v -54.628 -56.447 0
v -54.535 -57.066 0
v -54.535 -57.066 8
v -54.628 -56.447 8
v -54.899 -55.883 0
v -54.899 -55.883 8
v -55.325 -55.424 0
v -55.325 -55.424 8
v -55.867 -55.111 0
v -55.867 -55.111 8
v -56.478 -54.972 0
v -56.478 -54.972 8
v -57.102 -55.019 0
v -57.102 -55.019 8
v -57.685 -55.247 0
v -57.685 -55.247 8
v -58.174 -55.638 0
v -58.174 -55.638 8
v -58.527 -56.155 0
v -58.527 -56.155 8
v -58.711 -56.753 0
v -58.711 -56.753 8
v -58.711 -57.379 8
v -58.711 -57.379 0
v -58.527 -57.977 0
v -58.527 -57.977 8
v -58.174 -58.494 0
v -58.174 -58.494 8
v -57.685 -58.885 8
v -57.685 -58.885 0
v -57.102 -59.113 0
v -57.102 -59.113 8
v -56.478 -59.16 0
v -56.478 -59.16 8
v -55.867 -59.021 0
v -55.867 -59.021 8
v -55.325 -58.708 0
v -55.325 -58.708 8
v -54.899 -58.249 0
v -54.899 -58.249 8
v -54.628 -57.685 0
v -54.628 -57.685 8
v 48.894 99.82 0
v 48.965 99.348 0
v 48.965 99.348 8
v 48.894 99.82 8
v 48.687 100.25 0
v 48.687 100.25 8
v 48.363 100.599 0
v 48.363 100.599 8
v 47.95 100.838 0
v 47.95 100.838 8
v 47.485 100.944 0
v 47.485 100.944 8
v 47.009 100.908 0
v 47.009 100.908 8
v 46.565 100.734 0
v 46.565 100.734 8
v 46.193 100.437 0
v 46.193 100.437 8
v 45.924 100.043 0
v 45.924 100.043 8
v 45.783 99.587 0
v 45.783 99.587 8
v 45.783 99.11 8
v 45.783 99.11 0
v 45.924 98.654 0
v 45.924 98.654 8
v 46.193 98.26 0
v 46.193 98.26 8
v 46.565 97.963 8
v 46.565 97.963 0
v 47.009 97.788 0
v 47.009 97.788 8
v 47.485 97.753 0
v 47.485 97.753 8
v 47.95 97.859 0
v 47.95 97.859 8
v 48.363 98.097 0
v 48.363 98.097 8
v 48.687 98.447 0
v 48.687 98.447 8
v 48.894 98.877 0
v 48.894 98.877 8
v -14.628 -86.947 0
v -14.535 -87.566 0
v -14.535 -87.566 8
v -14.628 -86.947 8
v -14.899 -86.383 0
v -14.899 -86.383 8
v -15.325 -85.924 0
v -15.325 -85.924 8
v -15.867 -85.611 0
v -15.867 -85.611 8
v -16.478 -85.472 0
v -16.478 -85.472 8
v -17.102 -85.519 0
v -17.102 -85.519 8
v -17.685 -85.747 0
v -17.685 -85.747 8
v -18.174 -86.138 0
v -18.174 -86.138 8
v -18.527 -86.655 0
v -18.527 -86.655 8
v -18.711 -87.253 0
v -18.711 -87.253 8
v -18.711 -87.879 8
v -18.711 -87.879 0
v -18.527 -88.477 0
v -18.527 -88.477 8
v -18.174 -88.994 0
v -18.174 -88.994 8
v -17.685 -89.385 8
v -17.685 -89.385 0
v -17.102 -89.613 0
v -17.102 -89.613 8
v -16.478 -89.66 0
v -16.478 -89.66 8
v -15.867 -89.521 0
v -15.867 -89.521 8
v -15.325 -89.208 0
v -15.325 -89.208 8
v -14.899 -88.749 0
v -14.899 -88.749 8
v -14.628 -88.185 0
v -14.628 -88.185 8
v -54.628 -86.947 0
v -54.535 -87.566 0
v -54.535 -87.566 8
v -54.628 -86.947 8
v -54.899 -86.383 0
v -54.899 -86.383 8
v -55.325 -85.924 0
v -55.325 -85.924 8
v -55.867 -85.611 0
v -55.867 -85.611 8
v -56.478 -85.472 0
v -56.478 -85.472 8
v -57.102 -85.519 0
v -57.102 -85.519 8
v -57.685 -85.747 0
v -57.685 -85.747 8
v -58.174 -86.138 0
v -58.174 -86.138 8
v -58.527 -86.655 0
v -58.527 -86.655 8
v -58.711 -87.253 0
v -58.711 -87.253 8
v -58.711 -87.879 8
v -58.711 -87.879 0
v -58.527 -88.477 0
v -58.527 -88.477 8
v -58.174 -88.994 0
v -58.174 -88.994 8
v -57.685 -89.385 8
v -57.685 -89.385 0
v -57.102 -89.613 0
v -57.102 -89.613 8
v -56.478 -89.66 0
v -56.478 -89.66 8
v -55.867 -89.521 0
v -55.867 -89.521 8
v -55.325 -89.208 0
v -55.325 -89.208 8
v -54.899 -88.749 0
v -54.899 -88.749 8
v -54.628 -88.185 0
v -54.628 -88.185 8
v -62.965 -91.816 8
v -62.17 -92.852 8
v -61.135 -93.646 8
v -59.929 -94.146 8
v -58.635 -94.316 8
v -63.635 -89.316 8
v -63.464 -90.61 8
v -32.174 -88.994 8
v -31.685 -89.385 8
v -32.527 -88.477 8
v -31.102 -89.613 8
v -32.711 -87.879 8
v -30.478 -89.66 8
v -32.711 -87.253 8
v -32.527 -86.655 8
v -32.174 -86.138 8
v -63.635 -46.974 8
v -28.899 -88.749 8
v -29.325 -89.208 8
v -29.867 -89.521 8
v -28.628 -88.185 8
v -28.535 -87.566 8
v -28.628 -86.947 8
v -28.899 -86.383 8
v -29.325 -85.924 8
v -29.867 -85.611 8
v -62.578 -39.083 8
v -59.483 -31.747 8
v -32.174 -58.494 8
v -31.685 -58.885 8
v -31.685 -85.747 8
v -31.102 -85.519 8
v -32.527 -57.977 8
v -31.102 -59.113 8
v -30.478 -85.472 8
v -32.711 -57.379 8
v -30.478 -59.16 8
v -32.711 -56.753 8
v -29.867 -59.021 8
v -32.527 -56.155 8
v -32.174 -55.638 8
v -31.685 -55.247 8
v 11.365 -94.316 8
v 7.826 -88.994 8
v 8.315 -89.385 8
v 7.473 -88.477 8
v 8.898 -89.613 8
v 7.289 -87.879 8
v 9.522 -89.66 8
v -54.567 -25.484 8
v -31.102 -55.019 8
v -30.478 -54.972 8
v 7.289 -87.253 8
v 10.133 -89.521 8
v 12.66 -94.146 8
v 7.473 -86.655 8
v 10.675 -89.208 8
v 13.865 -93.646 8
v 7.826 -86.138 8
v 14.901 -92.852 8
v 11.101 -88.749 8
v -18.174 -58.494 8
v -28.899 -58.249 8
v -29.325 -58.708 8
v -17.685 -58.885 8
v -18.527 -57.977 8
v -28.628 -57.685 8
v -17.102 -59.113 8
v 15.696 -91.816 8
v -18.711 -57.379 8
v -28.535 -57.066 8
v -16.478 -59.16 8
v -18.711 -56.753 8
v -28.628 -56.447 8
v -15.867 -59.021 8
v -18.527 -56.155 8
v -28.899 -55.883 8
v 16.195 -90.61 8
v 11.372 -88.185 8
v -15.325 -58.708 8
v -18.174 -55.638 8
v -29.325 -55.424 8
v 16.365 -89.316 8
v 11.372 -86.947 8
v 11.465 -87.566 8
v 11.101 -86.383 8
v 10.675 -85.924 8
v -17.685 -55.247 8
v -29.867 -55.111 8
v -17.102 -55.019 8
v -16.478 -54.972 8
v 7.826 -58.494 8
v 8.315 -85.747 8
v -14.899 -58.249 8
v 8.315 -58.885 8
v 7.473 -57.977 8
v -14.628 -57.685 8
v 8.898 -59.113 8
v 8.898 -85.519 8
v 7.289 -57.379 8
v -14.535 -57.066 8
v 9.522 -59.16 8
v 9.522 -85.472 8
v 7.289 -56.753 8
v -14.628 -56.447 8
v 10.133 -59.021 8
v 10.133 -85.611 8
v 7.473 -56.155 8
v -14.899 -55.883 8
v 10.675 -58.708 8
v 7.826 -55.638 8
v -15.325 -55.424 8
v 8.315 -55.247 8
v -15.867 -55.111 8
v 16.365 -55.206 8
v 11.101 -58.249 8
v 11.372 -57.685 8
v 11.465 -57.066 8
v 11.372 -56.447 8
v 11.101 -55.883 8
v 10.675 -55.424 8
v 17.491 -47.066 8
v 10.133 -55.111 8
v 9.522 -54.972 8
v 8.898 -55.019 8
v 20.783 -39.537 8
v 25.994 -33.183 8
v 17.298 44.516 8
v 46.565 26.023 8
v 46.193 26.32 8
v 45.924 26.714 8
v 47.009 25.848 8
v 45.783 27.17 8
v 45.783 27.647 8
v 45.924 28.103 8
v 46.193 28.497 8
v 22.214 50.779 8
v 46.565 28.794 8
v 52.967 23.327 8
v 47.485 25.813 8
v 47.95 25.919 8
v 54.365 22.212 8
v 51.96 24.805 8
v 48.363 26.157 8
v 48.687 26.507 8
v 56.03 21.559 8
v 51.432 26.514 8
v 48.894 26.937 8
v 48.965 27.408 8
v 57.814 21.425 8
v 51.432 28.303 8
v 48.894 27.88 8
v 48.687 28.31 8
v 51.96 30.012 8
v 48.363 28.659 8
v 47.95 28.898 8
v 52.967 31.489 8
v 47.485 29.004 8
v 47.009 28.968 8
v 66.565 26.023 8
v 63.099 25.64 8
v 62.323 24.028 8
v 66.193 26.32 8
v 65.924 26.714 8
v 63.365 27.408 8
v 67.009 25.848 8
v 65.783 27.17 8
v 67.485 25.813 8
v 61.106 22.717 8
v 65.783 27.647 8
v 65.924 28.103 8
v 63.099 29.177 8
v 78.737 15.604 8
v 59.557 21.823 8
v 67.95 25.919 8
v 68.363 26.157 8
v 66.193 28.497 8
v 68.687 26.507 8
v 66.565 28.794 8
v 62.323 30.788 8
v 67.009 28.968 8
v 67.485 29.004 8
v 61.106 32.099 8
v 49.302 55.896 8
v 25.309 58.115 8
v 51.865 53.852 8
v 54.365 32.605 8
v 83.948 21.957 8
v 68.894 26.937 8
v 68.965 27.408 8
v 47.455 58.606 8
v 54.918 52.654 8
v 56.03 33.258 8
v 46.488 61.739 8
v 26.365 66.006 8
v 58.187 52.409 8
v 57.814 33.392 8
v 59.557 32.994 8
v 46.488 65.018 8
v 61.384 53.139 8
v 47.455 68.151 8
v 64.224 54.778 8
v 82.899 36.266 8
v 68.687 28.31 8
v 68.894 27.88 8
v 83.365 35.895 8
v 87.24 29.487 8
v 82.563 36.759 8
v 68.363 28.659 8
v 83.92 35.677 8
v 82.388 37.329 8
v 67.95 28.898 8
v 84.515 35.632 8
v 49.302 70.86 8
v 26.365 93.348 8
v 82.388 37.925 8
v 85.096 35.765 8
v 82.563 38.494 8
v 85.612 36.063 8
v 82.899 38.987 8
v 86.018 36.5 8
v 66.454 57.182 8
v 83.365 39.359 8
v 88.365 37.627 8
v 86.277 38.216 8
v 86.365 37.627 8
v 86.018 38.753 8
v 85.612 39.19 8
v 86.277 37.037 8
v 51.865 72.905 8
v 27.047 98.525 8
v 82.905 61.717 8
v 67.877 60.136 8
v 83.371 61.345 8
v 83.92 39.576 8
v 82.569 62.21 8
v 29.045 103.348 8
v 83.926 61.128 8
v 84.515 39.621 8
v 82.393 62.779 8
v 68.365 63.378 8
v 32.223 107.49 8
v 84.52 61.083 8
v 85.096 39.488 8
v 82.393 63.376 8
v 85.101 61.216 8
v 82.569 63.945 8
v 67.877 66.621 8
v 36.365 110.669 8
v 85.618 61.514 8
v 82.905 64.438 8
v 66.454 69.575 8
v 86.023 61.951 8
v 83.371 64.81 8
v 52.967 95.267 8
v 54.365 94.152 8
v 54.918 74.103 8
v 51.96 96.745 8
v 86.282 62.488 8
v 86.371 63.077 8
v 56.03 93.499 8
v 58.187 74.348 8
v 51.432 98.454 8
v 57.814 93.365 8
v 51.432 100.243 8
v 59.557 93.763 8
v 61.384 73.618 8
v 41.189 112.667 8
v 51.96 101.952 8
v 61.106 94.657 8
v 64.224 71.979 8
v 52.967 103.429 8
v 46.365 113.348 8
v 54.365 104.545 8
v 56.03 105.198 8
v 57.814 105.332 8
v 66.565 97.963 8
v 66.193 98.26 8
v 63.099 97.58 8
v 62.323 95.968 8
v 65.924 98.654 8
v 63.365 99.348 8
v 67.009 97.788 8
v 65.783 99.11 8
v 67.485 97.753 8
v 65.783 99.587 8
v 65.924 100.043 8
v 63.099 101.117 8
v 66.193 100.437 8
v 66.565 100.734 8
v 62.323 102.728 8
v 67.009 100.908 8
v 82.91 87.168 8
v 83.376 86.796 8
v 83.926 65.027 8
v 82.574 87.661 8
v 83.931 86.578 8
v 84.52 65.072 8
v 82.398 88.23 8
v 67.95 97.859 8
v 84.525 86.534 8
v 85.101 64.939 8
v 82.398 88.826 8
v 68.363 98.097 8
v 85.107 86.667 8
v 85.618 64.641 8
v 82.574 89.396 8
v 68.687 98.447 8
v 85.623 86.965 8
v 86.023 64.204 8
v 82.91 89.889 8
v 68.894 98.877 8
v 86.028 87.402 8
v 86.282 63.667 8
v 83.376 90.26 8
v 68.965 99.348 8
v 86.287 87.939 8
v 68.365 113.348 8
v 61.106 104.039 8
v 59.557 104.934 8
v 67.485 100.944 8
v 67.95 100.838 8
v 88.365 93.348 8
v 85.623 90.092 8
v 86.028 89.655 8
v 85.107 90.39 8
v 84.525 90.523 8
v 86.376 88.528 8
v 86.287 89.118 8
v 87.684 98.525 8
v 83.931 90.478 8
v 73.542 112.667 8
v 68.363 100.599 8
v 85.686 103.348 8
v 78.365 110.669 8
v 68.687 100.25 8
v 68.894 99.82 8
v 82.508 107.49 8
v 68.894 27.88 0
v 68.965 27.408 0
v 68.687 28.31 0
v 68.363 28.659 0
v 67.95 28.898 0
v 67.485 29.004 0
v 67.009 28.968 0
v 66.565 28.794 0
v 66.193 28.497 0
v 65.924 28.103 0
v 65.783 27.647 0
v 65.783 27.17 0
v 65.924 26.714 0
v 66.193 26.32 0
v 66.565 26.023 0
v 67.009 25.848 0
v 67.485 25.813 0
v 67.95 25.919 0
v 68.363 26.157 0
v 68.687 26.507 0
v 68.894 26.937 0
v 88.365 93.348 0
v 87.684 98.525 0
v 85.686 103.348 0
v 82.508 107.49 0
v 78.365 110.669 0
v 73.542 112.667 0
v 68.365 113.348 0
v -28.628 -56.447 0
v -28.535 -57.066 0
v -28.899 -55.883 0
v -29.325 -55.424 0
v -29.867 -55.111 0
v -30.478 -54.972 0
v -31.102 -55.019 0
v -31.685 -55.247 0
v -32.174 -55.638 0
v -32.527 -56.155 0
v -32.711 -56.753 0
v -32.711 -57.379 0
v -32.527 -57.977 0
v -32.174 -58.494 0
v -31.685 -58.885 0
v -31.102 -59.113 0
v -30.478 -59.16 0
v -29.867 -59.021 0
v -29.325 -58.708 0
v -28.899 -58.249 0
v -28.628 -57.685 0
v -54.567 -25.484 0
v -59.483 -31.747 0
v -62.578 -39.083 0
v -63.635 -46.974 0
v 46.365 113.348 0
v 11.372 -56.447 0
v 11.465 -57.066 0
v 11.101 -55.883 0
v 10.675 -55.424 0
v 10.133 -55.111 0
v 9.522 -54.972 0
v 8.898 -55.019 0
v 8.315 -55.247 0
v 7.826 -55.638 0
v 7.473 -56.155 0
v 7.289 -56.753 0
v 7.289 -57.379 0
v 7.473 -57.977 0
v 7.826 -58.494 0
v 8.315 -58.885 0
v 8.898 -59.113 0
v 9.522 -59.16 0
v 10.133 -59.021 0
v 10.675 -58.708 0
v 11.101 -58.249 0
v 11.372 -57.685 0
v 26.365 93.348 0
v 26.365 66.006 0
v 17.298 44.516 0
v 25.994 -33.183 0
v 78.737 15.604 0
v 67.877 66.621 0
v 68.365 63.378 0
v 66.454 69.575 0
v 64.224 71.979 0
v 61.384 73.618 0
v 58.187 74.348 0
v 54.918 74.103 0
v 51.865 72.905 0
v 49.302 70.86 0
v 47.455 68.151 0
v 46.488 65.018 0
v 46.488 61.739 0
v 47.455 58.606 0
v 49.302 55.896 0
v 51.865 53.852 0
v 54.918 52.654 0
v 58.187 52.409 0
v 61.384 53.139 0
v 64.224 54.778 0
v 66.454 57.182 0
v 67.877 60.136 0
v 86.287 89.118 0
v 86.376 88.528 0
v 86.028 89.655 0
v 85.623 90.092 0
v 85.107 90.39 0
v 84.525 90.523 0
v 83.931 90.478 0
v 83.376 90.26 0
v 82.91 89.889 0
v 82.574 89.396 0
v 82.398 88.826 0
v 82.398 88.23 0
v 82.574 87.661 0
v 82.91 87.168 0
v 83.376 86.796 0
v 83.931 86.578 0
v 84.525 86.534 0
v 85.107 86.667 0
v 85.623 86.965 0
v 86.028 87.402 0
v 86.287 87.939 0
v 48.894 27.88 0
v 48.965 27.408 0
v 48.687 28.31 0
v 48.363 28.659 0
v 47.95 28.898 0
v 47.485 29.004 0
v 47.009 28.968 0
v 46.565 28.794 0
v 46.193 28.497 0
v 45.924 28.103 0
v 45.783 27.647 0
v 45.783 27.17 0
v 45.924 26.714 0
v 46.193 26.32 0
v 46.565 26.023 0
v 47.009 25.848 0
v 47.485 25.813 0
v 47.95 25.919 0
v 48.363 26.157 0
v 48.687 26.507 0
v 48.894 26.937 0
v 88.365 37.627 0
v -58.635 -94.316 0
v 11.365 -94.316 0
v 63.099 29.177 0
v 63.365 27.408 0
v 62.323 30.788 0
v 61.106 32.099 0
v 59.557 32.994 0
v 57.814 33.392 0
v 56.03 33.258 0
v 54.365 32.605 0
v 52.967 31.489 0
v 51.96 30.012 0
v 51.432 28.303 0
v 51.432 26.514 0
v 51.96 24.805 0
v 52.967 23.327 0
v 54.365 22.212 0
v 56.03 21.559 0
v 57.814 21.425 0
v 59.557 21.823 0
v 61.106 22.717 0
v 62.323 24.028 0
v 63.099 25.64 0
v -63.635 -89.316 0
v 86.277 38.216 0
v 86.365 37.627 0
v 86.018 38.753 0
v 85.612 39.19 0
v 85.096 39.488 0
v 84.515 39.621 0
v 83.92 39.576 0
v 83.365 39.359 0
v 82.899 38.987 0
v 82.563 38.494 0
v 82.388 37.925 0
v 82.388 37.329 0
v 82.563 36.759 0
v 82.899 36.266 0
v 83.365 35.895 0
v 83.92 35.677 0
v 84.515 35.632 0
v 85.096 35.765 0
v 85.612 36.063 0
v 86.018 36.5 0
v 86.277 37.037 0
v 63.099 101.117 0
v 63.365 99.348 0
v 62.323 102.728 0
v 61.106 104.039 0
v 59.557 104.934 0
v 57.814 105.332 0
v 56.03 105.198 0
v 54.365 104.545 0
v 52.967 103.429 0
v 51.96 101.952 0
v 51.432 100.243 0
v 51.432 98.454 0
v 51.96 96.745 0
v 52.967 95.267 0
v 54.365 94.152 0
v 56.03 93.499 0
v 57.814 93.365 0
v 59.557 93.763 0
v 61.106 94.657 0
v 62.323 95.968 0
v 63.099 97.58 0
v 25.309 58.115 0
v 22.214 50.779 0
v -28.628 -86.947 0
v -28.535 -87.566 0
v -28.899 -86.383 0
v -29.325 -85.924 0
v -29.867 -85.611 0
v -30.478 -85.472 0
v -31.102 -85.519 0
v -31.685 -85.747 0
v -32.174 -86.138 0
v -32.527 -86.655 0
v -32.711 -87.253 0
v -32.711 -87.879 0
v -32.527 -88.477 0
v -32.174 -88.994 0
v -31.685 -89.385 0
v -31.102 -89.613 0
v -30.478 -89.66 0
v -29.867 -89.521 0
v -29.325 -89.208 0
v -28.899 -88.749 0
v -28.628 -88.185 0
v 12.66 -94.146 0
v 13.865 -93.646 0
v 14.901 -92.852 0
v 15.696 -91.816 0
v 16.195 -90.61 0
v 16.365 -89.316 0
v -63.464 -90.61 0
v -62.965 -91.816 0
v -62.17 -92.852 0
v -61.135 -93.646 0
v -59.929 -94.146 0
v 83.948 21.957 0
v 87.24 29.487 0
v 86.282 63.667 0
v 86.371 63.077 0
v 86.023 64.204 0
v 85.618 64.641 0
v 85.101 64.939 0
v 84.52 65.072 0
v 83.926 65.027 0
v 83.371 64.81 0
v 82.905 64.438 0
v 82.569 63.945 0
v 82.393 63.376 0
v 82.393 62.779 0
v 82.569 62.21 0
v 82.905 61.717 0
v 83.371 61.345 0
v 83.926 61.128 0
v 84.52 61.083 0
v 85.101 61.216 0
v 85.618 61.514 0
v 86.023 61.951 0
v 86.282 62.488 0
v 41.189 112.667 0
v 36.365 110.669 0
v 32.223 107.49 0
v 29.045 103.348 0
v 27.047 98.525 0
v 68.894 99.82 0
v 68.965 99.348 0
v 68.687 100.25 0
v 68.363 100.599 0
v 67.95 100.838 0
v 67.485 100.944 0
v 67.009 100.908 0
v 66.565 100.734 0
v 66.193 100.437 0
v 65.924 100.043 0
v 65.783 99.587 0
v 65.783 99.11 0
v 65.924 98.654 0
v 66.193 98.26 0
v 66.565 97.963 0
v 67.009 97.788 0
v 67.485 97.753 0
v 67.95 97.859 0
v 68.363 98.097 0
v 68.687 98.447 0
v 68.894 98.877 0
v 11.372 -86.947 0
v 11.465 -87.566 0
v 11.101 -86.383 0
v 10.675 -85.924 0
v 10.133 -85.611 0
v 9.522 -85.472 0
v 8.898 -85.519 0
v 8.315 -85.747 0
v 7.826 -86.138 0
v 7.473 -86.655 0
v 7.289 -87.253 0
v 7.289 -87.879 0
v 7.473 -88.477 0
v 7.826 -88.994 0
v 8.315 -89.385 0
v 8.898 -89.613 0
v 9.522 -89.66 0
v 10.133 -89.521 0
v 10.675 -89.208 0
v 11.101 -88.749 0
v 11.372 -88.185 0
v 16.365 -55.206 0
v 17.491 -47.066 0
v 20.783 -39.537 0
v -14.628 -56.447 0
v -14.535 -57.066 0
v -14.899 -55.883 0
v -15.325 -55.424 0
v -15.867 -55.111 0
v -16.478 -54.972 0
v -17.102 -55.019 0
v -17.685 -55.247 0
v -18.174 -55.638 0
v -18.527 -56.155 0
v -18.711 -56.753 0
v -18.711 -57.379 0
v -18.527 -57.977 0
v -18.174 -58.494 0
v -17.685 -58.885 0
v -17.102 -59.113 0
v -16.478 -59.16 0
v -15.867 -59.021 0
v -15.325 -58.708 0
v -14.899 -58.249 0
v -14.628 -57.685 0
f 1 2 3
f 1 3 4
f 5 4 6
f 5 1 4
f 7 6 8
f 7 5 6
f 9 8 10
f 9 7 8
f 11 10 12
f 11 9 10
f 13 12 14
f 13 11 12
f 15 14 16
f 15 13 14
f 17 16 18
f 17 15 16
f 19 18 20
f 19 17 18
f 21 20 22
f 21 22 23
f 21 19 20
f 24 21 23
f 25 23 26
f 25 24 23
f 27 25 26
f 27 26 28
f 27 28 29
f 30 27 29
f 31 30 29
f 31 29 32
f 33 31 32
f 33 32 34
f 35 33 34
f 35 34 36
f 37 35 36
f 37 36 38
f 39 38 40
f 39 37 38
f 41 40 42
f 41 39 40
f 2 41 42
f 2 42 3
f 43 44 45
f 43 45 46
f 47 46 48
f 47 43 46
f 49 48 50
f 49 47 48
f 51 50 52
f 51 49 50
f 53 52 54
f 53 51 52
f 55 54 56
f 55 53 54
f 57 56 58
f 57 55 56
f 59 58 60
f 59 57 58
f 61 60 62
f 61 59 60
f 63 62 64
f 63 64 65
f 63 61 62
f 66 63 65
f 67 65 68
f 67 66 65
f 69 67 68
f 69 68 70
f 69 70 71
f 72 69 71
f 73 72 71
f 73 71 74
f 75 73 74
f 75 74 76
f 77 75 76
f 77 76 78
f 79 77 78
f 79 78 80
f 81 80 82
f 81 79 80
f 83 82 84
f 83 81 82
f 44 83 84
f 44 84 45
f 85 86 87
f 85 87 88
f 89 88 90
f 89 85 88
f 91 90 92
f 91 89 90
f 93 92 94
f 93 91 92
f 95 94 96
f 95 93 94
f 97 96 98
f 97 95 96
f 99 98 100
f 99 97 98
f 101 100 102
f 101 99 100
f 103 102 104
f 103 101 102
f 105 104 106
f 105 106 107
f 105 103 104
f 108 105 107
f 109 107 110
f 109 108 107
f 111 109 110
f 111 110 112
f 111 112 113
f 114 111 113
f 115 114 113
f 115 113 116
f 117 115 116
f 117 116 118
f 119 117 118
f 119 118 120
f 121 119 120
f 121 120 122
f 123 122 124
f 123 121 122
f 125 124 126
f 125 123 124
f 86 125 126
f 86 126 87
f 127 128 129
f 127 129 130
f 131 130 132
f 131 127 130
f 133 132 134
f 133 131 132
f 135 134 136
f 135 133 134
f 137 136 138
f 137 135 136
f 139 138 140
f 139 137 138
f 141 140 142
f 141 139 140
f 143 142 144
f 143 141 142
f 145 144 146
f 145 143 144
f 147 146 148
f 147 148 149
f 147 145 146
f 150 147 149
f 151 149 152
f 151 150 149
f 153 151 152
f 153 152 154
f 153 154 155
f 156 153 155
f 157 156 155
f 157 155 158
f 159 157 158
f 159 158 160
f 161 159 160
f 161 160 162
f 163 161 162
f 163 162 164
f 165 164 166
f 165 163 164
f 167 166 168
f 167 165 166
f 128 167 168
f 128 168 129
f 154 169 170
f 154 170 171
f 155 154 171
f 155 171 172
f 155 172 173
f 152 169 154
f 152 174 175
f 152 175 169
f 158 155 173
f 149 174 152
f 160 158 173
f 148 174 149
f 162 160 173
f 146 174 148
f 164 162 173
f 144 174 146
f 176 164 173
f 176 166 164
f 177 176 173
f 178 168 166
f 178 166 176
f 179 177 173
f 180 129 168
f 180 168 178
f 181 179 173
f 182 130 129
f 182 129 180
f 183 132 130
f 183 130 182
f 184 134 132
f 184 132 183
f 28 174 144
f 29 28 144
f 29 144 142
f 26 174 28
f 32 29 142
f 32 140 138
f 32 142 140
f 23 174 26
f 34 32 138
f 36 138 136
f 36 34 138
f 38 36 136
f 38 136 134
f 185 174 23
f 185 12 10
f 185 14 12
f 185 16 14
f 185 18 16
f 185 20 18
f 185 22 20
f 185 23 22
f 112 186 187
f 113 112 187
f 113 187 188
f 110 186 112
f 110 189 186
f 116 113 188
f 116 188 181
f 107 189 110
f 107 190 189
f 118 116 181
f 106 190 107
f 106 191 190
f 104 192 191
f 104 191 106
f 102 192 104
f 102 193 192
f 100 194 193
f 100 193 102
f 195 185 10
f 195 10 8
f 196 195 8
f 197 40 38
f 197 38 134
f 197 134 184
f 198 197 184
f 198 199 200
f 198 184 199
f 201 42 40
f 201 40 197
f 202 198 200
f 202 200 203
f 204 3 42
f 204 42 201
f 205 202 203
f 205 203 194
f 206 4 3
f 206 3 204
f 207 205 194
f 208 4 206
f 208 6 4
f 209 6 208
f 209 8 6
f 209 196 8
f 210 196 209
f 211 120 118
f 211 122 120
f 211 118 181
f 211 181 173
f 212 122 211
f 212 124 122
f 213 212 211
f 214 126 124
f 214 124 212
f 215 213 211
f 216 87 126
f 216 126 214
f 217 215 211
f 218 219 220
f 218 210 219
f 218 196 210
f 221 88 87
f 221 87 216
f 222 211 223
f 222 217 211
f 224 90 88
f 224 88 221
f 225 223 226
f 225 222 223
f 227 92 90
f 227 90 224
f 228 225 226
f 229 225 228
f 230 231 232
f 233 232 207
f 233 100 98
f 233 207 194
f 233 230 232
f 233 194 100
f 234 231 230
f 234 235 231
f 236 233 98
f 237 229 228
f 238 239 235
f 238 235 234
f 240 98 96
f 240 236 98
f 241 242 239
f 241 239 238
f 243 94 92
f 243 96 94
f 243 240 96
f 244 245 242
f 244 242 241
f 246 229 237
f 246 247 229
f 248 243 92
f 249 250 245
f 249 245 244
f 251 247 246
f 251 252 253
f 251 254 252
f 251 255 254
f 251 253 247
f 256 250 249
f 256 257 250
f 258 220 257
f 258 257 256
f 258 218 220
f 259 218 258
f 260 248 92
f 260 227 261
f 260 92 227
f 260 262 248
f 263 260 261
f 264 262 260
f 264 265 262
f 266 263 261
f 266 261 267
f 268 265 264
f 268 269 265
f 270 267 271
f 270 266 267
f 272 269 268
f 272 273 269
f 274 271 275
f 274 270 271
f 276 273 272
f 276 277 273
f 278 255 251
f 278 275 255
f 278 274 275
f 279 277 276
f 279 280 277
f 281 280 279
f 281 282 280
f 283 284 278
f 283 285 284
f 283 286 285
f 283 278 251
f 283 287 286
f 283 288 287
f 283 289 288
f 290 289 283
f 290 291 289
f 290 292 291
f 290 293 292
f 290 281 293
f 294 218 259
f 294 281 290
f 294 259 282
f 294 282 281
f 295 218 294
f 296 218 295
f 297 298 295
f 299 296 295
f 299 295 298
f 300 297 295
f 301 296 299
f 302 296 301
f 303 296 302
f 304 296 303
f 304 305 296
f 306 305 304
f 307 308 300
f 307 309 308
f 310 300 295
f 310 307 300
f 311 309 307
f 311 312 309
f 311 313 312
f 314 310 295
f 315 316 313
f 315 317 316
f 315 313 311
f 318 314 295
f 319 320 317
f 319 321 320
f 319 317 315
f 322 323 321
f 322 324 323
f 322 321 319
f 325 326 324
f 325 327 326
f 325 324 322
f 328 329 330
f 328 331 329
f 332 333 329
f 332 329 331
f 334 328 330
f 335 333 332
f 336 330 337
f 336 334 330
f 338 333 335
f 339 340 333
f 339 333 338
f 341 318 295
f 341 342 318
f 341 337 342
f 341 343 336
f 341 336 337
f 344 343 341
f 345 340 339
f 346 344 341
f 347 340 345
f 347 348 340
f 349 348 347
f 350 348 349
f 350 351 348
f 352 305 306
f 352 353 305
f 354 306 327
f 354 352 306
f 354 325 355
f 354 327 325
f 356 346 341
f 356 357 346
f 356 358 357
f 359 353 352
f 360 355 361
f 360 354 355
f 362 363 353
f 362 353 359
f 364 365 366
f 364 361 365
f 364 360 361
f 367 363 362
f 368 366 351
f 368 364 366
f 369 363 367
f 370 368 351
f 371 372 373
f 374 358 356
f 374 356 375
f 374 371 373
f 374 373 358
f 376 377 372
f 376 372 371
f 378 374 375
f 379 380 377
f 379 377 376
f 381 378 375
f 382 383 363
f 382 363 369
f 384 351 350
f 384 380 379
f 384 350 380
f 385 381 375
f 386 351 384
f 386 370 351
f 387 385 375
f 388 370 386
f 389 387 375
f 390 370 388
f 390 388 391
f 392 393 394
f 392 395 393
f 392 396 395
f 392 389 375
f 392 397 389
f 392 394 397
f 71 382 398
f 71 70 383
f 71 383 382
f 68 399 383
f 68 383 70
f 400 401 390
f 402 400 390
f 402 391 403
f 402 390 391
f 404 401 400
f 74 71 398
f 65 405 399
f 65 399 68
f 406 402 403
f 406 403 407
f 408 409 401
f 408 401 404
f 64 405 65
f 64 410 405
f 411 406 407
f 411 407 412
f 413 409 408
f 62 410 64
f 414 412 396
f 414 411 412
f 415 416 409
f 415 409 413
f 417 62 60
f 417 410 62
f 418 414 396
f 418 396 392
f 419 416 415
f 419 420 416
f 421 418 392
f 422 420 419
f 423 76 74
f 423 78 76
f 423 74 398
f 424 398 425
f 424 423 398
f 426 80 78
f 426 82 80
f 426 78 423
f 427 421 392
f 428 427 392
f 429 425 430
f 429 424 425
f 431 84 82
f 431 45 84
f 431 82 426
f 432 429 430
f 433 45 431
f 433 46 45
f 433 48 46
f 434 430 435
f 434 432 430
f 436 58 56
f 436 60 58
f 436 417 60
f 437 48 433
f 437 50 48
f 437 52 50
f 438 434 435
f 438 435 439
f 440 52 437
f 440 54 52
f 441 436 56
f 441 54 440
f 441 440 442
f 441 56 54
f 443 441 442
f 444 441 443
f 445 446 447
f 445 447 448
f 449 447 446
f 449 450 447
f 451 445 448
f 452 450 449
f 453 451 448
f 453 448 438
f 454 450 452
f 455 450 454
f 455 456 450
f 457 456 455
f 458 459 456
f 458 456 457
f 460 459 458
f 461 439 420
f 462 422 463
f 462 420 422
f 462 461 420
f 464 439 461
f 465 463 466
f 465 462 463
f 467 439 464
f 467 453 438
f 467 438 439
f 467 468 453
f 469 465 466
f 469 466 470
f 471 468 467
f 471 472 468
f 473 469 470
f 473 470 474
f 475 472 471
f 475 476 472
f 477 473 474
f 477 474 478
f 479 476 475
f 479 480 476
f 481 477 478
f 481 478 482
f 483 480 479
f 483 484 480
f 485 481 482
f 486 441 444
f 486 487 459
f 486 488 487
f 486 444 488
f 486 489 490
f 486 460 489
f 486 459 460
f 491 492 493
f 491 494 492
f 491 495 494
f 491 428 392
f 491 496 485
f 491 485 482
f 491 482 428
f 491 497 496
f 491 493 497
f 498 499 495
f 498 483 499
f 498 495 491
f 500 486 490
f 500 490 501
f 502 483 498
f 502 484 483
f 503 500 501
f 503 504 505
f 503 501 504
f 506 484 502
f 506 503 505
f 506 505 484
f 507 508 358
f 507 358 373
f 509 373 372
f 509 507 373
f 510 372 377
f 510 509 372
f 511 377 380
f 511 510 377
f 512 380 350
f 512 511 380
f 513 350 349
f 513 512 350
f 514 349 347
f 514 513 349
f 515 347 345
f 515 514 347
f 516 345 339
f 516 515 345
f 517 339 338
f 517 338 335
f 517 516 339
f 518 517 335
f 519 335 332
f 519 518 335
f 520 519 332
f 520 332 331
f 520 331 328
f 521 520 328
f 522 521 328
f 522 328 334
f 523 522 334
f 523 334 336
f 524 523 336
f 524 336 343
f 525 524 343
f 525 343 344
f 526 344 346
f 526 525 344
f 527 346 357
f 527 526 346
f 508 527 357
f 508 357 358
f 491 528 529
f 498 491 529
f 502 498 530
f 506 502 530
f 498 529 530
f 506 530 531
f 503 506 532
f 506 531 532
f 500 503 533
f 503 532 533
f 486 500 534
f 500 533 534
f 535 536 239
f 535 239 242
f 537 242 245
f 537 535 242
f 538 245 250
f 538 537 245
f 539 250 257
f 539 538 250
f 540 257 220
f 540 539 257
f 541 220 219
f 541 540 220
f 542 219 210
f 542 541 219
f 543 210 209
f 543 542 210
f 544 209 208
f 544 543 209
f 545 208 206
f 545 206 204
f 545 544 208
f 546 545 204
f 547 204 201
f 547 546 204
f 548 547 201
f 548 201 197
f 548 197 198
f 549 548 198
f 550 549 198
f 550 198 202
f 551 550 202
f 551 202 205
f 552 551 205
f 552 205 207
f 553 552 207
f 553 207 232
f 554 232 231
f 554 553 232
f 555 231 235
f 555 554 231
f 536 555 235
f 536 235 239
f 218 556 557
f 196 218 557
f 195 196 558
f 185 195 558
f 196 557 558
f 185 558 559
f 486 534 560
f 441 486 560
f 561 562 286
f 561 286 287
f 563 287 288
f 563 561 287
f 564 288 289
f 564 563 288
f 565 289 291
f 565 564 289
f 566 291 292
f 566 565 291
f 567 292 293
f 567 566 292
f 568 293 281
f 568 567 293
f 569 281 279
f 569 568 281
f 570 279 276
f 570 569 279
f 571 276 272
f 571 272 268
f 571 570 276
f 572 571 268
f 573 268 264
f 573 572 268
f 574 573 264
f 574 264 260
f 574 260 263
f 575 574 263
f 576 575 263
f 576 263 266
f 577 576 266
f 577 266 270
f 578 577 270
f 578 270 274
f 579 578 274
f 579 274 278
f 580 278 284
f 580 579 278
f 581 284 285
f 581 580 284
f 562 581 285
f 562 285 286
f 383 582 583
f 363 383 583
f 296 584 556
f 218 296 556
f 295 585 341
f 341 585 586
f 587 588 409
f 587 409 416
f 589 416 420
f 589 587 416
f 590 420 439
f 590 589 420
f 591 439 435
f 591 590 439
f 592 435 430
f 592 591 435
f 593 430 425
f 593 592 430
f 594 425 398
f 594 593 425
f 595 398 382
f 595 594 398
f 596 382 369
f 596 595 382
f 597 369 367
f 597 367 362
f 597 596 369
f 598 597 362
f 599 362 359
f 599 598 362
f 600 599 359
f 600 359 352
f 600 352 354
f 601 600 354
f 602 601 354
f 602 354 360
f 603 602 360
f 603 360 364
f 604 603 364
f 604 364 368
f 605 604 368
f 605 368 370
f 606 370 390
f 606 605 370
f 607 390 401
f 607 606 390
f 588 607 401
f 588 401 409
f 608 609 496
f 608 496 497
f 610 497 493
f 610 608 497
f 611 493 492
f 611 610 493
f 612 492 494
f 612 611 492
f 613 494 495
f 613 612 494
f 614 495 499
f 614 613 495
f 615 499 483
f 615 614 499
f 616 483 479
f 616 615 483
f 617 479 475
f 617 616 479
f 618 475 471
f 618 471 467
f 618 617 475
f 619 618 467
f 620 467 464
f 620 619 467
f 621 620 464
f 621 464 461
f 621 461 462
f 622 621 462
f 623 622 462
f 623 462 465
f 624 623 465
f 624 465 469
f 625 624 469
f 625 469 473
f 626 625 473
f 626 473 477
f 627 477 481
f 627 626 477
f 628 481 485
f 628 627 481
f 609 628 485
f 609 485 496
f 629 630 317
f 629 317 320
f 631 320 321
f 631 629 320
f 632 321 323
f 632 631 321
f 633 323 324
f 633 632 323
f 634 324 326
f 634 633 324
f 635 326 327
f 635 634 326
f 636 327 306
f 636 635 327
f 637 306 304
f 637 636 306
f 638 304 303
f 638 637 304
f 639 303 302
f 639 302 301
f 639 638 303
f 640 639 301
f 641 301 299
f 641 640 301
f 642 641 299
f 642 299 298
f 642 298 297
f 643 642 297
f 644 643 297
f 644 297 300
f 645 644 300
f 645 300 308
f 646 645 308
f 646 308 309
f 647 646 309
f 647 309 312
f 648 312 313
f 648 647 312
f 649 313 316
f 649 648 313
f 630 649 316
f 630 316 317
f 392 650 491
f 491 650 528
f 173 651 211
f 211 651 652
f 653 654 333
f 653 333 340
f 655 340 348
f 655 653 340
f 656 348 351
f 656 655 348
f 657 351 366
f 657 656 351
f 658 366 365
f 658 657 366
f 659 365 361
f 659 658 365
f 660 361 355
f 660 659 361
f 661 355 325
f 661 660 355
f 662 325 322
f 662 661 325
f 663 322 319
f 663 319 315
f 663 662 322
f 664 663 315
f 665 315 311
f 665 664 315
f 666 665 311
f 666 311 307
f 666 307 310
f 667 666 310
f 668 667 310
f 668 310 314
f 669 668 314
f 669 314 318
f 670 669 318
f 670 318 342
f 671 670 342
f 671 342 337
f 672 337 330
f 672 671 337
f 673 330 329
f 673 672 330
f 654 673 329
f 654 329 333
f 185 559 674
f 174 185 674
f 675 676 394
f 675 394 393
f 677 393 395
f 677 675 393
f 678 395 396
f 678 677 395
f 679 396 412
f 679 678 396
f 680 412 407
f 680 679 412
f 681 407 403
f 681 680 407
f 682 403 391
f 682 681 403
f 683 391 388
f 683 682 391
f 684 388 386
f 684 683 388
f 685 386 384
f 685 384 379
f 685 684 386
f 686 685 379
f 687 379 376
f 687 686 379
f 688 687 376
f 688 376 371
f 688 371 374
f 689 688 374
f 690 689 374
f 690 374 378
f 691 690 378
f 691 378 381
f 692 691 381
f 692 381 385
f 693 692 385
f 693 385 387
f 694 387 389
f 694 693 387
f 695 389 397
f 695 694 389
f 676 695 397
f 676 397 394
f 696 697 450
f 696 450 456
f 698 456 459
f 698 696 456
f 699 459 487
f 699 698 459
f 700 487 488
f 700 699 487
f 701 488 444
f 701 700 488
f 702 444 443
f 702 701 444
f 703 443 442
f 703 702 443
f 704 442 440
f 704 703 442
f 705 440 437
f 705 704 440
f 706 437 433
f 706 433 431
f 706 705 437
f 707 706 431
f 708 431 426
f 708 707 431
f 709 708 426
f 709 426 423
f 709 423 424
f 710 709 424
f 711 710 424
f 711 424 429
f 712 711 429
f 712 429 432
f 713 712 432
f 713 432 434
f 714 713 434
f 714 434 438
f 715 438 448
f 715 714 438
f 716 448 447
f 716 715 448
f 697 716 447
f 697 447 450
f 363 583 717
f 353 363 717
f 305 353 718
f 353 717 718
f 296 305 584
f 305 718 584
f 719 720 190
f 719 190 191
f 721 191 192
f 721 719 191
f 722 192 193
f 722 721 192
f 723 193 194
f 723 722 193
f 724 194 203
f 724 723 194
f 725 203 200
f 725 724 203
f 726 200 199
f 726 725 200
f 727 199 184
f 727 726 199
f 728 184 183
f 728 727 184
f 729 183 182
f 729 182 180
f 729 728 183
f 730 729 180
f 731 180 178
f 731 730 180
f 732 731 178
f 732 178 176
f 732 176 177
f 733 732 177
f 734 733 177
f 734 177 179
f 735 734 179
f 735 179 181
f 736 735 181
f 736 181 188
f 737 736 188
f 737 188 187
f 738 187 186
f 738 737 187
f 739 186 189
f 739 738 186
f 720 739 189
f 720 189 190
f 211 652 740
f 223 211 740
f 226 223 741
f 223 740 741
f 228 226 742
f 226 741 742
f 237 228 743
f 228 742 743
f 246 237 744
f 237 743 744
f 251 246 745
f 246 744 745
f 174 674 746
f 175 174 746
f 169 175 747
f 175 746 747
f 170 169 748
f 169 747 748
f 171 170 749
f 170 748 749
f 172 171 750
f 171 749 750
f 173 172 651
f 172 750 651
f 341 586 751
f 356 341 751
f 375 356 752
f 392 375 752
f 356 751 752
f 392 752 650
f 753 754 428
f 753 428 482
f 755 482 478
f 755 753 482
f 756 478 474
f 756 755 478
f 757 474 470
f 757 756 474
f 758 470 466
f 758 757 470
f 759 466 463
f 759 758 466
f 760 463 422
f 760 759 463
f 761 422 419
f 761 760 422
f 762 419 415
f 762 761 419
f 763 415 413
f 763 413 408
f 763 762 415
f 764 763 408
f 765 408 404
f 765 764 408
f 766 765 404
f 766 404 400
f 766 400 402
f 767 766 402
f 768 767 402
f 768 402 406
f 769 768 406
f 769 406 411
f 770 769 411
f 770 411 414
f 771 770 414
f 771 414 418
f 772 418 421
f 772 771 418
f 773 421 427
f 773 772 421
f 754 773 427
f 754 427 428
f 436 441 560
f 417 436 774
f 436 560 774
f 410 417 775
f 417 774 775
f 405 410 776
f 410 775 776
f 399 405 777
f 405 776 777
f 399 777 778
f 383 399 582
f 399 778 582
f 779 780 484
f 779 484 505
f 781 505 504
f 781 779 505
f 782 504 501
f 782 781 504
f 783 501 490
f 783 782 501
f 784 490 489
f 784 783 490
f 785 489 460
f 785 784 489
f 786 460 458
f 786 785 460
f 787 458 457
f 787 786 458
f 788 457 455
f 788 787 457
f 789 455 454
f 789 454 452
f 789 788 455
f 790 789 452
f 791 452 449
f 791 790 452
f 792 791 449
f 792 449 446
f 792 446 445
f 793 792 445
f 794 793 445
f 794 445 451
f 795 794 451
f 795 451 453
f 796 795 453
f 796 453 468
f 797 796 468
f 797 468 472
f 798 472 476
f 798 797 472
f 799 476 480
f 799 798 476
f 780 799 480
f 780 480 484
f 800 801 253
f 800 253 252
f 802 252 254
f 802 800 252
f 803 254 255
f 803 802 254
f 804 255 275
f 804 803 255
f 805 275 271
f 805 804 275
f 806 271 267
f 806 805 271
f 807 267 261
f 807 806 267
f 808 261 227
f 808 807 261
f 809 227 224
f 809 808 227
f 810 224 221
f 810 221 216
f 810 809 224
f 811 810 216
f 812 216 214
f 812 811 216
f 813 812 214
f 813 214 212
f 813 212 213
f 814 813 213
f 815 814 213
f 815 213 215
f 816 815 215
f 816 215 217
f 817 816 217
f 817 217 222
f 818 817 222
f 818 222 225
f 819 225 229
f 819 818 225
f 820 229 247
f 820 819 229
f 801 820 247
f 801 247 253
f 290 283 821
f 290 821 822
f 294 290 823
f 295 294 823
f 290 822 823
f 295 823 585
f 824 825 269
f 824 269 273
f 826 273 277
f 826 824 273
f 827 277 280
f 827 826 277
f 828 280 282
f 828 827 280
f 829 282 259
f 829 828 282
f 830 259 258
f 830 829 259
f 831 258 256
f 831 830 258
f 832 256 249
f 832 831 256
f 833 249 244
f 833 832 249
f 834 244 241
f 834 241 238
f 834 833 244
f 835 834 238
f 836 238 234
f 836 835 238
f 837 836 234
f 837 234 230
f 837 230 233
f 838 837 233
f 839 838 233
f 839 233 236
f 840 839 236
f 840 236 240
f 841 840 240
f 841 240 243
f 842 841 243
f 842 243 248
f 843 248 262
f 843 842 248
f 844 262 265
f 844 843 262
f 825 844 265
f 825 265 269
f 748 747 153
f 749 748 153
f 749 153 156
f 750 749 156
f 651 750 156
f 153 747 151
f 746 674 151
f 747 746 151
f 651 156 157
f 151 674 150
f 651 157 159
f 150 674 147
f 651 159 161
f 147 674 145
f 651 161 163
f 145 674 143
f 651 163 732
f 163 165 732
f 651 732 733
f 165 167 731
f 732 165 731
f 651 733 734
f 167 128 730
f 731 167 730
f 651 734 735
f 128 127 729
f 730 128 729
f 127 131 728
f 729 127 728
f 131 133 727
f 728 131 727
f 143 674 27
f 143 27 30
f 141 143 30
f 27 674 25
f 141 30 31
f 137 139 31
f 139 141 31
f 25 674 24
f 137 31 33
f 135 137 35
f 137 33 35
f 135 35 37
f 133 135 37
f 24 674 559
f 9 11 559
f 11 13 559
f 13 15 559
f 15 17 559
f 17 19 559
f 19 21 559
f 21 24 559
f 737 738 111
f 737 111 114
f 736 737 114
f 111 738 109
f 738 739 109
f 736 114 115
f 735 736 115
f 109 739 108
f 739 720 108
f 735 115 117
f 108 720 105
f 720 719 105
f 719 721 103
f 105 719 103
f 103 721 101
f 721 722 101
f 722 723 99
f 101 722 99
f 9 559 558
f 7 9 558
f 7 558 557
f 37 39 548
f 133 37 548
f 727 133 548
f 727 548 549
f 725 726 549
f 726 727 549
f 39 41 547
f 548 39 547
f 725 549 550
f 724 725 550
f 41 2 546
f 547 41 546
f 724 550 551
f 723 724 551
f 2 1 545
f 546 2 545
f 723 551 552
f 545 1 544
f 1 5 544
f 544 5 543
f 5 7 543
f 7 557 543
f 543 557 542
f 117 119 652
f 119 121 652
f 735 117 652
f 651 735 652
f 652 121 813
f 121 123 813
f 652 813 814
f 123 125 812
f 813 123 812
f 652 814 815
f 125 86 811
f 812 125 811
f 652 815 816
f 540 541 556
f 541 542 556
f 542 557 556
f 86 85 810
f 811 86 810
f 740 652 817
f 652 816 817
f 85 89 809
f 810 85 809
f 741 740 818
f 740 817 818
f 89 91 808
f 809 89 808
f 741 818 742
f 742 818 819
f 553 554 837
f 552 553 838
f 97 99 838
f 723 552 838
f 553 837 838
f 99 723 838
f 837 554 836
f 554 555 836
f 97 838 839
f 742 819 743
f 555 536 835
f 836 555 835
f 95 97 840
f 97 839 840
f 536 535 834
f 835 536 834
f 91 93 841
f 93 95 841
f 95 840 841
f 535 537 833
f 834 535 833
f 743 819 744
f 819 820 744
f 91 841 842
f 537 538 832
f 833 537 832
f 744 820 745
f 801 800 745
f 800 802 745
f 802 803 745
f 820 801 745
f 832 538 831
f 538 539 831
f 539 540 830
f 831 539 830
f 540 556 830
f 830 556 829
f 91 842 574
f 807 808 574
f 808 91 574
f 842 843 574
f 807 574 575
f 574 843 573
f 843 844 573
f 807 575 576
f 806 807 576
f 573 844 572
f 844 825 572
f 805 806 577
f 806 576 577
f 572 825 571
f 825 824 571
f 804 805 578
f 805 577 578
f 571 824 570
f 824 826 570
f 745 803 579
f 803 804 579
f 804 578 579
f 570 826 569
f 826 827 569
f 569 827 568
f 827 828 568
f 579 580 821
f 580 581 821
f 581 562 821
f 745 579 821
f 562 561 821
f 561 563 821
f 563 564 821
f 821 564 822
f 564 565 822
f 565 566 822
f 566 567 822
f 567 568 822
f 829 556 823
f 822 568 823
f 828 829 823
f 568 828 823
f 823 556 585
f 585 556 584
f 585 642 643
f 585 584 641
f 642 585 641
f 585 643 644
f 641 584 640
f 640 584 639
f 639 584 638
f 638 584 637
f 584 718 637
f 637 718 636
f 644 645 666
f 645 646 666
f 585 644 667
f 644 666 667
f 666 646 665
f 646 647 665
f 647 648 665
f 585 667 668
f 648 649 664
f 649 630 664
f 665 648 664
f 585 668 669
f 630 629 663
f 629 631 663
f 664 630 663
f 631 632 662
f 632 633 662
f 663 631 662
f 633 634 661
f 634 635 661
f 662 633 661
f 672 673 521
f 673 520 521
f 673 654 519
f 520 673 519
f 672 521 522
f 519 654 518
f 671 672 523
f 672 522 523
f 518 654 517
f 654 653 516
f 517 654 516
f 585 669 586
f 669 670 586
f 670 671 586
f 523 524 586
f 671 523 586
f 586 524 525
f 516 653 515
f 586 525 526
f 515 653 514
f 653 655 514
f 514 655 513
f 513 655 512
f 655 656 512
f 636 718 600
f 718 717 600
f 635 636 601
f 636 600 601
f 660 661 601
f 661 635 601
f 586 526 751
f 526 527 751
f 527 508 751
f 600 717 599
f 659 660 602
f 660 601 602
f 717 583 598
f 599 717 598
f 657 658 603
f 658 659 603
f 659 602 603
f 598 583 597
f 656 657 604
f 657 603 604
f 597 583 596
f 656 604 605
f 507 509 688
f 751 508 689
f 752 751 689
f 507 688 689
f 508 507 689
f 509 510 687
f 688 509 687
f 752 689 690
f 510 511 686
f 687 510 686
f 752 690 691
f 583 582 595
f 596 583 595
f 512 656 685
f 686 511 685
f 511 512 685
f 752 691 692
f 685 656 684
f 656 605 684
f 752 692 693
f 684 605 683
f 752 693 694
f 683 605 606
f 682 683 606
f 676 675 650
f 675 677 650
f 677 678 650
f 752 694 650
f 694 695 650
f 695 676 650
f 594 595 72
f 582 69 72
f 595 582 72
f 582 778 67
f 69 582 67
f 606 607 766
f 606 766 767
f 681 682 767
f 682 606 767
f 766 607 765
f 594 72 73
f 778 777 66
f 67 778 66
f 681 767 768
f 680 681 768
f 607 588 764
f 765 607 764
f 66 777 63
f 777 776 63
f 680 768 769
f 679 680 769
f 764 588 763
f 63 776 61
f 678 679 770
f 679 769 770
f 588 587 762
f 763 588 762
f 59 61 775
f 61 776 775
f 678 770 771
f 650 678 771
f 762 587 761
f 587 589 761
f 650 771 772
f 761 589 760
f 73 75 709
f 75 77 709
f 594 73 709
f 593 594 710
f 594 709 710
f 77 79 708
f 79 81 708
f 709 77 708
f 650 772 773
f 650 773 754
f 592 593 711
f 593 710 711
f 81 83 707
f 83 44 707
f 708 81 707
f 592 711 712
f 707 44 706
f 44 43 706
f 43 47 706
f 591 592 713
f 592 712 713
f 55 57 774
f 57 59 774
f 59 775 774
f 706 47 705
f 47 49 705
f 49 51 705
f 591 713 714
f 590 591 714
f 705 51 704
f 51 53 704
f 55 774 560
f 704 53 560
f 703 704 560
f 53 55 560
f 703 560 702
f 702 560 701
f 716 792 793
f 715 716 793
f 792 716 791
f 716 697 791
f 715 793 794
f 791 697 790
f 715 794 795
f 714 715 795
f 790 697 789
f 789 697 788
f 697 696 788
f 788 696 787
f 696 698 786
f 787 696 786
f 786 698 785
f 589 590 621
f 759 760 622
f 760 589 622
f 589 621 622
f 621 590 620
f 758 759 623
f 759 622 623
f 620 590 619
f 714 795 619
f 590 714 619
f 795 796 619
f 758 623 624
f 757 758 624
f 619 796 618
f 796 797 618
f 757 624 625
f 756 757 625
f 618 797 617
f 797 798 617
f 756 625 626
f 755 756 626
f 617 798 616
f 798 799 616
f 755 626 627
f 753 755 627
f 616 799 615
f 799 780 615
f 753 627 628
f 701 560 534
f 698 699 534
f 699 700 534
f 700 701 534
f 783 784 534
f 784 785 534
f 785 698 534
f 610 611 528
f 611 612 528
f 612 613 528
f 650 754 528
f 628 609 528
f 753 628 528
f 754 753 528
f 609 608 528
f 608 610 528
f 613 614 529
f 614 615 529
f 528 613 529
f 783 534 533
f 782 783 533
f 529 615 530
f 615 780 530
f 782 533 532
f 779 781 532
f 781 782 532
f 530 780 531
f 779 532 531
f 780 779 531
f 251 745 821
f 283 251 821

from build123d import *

# Parameters (mm, degrees)
SKETCH1_R           = 2.1
SKETCH1_R_2         = 6
SKETCH1_R_3         = 11
SKETCH1_R_4         = 2
SKETCH1_R_5         = 1.6
BOSS_EXTRUDE1_DEPTH = 8


with BuildPart() as part:
    # Sketch1 → Boss-Extrude1 (new body)
    with BuildSketch(Plane.XY):
        with BuildLine():
            Line((-58.634566509, -94.315974521), (11.365433491, -94.315974521))
            ThreePointArc((11.365433491, -94.315974521), (14.900967397, -92.851508427), (16.365433491, -89.315974521))
            Line((16.365433491, -89.315974521), (16.365433491, -55.206132823))
            ThreePointArc((16.365433491, -55.206132823), (18.877822606, -43.188177597), (25.994183345, -33.18314103))
            Line((25.994183345, -33.18314103), (78.736683637, 15.603630397))
            ThreePointArc((78.736683637, 15.603630397), (85.853044376, 25.608666964), (88.365433491, 37.62662219))
            Line((88.365433491, 37.62662219), (88.365433491, 93.348359509))
            ThreePointArc((88.365433491, 93.348359509), (82.507569115, 107.490495133), (68.365433491, 113.348359509))
            Line((68.365433491, 113.348359509), (46.365433491, 113.348359509))
            ThreePointArc((46.365433491, 113.348359509), (32.223297867, 107.490495133), (26.365433491, 93.348359509))
            Line((26.365433491, 93.348359509), (26.365433491, 66.006418518))
            ThreePointArc((26.365433491, 66.006418518), (24.005761373, 54.343988473), (17.29794852, 44.516192494))
            Line((17.29794852, 44.516192494), (-54.567081538, -25.483807506))
            ThreePointArc((-54.567081538, -25.483807506), (-61.274894391, -35.311603484), (-63.634566509, -46.97403353))
            Line((-63.634566509, -46.97403353), (-63.634566509, -89.315974521))
            ThreePointArc((-63.634566509, -89.315974521), (-62.170100415, -92.851508427), (-58.634566509, -94.315974521))
        make_face()
        with Locations((-56.634566509, -57.065974521)):
            Circle(SKETCH1_R, mode=Mode.SUBTRACT)
        with Locations((-30.634566509, -57.065974521)):
            Circle(SKETCH1_R, mode=Mode.SUBTRACT)
        with Locations((-30.634566509, -87.565974521)):
            Circle(SKETCH1_R, mode=Mode.SUBTRACT)
        with Locations((-56.634566509, -87.565974521)):
            Circle(SKETCH1_R, mode=Mode.SUBTRACT)
        with Locations((9.365433491, -87.565974521)):
            Circle(SKETCH1_R, mode=Mode.SUBTRACT)
        with Locations((-16.634566509, -87.565974521)):
            Circle(SKETCH1_R, mode=Mode.SUBTRACT)
        with Locations((-16.634566509, -57.065974521)):
            Circle(SKETCH1_R, mode=Mode.SUBTRACT)
        with Locations((9.365433491, -57.065974521)):
            Circle(SKETCH1_R, mode=Mode.SUBTRACT)
        with Locations((57.365433491, 99.348359509)):
            Circle(SKETCH1_R_2, mode=Mode.SUBTRACT)
        with Locations((57.365433491, 27.408359509)):
            Circle(SKETCH1_R_2, mode=Mode.SUBTRACT)
        with Locations((57.365433491, 63.378359509)):
            Circle(SKETCH1_R_3, mode=Mode.SUBTRACT)
        with Locations((84.365433491, 37.62662219)):
            Circle(SKETCH1_R_4, mode=Mode.SUBTRACT)
        with Locations((84.375885899, 88.528341433)):
            Circle(SKETCH1_R_4, mode=Mode.SUBTRACT)
        with Locations((47.365433491, 99.348359509)):
            Circle(SKETCH1_R_5, mode=Mode.SUBTRACT)
        with Locations((47.365433491, 27.408359509)):
            Circle(SKETCH1_R_5, mode=Mode.SUBTRACT)
        with Locations((67.365433491, 99.348359509)):
            Circle(SKETCH1_R_5, mode=Mode.SUBTRACT)
        with Locations((67.365433491, 27.408359509)):
            Circle(SKETCH1_R_5, mode=Mode.SUBTRACT)
        with Locations((84.370659695, 63.077481811)):
            Circle(SKETCH1_R_4, mode=Mode.SUBTRACT)
    extrude(amount=BOSS_EXTRUDE1_DEPTH)


solid = part.part
